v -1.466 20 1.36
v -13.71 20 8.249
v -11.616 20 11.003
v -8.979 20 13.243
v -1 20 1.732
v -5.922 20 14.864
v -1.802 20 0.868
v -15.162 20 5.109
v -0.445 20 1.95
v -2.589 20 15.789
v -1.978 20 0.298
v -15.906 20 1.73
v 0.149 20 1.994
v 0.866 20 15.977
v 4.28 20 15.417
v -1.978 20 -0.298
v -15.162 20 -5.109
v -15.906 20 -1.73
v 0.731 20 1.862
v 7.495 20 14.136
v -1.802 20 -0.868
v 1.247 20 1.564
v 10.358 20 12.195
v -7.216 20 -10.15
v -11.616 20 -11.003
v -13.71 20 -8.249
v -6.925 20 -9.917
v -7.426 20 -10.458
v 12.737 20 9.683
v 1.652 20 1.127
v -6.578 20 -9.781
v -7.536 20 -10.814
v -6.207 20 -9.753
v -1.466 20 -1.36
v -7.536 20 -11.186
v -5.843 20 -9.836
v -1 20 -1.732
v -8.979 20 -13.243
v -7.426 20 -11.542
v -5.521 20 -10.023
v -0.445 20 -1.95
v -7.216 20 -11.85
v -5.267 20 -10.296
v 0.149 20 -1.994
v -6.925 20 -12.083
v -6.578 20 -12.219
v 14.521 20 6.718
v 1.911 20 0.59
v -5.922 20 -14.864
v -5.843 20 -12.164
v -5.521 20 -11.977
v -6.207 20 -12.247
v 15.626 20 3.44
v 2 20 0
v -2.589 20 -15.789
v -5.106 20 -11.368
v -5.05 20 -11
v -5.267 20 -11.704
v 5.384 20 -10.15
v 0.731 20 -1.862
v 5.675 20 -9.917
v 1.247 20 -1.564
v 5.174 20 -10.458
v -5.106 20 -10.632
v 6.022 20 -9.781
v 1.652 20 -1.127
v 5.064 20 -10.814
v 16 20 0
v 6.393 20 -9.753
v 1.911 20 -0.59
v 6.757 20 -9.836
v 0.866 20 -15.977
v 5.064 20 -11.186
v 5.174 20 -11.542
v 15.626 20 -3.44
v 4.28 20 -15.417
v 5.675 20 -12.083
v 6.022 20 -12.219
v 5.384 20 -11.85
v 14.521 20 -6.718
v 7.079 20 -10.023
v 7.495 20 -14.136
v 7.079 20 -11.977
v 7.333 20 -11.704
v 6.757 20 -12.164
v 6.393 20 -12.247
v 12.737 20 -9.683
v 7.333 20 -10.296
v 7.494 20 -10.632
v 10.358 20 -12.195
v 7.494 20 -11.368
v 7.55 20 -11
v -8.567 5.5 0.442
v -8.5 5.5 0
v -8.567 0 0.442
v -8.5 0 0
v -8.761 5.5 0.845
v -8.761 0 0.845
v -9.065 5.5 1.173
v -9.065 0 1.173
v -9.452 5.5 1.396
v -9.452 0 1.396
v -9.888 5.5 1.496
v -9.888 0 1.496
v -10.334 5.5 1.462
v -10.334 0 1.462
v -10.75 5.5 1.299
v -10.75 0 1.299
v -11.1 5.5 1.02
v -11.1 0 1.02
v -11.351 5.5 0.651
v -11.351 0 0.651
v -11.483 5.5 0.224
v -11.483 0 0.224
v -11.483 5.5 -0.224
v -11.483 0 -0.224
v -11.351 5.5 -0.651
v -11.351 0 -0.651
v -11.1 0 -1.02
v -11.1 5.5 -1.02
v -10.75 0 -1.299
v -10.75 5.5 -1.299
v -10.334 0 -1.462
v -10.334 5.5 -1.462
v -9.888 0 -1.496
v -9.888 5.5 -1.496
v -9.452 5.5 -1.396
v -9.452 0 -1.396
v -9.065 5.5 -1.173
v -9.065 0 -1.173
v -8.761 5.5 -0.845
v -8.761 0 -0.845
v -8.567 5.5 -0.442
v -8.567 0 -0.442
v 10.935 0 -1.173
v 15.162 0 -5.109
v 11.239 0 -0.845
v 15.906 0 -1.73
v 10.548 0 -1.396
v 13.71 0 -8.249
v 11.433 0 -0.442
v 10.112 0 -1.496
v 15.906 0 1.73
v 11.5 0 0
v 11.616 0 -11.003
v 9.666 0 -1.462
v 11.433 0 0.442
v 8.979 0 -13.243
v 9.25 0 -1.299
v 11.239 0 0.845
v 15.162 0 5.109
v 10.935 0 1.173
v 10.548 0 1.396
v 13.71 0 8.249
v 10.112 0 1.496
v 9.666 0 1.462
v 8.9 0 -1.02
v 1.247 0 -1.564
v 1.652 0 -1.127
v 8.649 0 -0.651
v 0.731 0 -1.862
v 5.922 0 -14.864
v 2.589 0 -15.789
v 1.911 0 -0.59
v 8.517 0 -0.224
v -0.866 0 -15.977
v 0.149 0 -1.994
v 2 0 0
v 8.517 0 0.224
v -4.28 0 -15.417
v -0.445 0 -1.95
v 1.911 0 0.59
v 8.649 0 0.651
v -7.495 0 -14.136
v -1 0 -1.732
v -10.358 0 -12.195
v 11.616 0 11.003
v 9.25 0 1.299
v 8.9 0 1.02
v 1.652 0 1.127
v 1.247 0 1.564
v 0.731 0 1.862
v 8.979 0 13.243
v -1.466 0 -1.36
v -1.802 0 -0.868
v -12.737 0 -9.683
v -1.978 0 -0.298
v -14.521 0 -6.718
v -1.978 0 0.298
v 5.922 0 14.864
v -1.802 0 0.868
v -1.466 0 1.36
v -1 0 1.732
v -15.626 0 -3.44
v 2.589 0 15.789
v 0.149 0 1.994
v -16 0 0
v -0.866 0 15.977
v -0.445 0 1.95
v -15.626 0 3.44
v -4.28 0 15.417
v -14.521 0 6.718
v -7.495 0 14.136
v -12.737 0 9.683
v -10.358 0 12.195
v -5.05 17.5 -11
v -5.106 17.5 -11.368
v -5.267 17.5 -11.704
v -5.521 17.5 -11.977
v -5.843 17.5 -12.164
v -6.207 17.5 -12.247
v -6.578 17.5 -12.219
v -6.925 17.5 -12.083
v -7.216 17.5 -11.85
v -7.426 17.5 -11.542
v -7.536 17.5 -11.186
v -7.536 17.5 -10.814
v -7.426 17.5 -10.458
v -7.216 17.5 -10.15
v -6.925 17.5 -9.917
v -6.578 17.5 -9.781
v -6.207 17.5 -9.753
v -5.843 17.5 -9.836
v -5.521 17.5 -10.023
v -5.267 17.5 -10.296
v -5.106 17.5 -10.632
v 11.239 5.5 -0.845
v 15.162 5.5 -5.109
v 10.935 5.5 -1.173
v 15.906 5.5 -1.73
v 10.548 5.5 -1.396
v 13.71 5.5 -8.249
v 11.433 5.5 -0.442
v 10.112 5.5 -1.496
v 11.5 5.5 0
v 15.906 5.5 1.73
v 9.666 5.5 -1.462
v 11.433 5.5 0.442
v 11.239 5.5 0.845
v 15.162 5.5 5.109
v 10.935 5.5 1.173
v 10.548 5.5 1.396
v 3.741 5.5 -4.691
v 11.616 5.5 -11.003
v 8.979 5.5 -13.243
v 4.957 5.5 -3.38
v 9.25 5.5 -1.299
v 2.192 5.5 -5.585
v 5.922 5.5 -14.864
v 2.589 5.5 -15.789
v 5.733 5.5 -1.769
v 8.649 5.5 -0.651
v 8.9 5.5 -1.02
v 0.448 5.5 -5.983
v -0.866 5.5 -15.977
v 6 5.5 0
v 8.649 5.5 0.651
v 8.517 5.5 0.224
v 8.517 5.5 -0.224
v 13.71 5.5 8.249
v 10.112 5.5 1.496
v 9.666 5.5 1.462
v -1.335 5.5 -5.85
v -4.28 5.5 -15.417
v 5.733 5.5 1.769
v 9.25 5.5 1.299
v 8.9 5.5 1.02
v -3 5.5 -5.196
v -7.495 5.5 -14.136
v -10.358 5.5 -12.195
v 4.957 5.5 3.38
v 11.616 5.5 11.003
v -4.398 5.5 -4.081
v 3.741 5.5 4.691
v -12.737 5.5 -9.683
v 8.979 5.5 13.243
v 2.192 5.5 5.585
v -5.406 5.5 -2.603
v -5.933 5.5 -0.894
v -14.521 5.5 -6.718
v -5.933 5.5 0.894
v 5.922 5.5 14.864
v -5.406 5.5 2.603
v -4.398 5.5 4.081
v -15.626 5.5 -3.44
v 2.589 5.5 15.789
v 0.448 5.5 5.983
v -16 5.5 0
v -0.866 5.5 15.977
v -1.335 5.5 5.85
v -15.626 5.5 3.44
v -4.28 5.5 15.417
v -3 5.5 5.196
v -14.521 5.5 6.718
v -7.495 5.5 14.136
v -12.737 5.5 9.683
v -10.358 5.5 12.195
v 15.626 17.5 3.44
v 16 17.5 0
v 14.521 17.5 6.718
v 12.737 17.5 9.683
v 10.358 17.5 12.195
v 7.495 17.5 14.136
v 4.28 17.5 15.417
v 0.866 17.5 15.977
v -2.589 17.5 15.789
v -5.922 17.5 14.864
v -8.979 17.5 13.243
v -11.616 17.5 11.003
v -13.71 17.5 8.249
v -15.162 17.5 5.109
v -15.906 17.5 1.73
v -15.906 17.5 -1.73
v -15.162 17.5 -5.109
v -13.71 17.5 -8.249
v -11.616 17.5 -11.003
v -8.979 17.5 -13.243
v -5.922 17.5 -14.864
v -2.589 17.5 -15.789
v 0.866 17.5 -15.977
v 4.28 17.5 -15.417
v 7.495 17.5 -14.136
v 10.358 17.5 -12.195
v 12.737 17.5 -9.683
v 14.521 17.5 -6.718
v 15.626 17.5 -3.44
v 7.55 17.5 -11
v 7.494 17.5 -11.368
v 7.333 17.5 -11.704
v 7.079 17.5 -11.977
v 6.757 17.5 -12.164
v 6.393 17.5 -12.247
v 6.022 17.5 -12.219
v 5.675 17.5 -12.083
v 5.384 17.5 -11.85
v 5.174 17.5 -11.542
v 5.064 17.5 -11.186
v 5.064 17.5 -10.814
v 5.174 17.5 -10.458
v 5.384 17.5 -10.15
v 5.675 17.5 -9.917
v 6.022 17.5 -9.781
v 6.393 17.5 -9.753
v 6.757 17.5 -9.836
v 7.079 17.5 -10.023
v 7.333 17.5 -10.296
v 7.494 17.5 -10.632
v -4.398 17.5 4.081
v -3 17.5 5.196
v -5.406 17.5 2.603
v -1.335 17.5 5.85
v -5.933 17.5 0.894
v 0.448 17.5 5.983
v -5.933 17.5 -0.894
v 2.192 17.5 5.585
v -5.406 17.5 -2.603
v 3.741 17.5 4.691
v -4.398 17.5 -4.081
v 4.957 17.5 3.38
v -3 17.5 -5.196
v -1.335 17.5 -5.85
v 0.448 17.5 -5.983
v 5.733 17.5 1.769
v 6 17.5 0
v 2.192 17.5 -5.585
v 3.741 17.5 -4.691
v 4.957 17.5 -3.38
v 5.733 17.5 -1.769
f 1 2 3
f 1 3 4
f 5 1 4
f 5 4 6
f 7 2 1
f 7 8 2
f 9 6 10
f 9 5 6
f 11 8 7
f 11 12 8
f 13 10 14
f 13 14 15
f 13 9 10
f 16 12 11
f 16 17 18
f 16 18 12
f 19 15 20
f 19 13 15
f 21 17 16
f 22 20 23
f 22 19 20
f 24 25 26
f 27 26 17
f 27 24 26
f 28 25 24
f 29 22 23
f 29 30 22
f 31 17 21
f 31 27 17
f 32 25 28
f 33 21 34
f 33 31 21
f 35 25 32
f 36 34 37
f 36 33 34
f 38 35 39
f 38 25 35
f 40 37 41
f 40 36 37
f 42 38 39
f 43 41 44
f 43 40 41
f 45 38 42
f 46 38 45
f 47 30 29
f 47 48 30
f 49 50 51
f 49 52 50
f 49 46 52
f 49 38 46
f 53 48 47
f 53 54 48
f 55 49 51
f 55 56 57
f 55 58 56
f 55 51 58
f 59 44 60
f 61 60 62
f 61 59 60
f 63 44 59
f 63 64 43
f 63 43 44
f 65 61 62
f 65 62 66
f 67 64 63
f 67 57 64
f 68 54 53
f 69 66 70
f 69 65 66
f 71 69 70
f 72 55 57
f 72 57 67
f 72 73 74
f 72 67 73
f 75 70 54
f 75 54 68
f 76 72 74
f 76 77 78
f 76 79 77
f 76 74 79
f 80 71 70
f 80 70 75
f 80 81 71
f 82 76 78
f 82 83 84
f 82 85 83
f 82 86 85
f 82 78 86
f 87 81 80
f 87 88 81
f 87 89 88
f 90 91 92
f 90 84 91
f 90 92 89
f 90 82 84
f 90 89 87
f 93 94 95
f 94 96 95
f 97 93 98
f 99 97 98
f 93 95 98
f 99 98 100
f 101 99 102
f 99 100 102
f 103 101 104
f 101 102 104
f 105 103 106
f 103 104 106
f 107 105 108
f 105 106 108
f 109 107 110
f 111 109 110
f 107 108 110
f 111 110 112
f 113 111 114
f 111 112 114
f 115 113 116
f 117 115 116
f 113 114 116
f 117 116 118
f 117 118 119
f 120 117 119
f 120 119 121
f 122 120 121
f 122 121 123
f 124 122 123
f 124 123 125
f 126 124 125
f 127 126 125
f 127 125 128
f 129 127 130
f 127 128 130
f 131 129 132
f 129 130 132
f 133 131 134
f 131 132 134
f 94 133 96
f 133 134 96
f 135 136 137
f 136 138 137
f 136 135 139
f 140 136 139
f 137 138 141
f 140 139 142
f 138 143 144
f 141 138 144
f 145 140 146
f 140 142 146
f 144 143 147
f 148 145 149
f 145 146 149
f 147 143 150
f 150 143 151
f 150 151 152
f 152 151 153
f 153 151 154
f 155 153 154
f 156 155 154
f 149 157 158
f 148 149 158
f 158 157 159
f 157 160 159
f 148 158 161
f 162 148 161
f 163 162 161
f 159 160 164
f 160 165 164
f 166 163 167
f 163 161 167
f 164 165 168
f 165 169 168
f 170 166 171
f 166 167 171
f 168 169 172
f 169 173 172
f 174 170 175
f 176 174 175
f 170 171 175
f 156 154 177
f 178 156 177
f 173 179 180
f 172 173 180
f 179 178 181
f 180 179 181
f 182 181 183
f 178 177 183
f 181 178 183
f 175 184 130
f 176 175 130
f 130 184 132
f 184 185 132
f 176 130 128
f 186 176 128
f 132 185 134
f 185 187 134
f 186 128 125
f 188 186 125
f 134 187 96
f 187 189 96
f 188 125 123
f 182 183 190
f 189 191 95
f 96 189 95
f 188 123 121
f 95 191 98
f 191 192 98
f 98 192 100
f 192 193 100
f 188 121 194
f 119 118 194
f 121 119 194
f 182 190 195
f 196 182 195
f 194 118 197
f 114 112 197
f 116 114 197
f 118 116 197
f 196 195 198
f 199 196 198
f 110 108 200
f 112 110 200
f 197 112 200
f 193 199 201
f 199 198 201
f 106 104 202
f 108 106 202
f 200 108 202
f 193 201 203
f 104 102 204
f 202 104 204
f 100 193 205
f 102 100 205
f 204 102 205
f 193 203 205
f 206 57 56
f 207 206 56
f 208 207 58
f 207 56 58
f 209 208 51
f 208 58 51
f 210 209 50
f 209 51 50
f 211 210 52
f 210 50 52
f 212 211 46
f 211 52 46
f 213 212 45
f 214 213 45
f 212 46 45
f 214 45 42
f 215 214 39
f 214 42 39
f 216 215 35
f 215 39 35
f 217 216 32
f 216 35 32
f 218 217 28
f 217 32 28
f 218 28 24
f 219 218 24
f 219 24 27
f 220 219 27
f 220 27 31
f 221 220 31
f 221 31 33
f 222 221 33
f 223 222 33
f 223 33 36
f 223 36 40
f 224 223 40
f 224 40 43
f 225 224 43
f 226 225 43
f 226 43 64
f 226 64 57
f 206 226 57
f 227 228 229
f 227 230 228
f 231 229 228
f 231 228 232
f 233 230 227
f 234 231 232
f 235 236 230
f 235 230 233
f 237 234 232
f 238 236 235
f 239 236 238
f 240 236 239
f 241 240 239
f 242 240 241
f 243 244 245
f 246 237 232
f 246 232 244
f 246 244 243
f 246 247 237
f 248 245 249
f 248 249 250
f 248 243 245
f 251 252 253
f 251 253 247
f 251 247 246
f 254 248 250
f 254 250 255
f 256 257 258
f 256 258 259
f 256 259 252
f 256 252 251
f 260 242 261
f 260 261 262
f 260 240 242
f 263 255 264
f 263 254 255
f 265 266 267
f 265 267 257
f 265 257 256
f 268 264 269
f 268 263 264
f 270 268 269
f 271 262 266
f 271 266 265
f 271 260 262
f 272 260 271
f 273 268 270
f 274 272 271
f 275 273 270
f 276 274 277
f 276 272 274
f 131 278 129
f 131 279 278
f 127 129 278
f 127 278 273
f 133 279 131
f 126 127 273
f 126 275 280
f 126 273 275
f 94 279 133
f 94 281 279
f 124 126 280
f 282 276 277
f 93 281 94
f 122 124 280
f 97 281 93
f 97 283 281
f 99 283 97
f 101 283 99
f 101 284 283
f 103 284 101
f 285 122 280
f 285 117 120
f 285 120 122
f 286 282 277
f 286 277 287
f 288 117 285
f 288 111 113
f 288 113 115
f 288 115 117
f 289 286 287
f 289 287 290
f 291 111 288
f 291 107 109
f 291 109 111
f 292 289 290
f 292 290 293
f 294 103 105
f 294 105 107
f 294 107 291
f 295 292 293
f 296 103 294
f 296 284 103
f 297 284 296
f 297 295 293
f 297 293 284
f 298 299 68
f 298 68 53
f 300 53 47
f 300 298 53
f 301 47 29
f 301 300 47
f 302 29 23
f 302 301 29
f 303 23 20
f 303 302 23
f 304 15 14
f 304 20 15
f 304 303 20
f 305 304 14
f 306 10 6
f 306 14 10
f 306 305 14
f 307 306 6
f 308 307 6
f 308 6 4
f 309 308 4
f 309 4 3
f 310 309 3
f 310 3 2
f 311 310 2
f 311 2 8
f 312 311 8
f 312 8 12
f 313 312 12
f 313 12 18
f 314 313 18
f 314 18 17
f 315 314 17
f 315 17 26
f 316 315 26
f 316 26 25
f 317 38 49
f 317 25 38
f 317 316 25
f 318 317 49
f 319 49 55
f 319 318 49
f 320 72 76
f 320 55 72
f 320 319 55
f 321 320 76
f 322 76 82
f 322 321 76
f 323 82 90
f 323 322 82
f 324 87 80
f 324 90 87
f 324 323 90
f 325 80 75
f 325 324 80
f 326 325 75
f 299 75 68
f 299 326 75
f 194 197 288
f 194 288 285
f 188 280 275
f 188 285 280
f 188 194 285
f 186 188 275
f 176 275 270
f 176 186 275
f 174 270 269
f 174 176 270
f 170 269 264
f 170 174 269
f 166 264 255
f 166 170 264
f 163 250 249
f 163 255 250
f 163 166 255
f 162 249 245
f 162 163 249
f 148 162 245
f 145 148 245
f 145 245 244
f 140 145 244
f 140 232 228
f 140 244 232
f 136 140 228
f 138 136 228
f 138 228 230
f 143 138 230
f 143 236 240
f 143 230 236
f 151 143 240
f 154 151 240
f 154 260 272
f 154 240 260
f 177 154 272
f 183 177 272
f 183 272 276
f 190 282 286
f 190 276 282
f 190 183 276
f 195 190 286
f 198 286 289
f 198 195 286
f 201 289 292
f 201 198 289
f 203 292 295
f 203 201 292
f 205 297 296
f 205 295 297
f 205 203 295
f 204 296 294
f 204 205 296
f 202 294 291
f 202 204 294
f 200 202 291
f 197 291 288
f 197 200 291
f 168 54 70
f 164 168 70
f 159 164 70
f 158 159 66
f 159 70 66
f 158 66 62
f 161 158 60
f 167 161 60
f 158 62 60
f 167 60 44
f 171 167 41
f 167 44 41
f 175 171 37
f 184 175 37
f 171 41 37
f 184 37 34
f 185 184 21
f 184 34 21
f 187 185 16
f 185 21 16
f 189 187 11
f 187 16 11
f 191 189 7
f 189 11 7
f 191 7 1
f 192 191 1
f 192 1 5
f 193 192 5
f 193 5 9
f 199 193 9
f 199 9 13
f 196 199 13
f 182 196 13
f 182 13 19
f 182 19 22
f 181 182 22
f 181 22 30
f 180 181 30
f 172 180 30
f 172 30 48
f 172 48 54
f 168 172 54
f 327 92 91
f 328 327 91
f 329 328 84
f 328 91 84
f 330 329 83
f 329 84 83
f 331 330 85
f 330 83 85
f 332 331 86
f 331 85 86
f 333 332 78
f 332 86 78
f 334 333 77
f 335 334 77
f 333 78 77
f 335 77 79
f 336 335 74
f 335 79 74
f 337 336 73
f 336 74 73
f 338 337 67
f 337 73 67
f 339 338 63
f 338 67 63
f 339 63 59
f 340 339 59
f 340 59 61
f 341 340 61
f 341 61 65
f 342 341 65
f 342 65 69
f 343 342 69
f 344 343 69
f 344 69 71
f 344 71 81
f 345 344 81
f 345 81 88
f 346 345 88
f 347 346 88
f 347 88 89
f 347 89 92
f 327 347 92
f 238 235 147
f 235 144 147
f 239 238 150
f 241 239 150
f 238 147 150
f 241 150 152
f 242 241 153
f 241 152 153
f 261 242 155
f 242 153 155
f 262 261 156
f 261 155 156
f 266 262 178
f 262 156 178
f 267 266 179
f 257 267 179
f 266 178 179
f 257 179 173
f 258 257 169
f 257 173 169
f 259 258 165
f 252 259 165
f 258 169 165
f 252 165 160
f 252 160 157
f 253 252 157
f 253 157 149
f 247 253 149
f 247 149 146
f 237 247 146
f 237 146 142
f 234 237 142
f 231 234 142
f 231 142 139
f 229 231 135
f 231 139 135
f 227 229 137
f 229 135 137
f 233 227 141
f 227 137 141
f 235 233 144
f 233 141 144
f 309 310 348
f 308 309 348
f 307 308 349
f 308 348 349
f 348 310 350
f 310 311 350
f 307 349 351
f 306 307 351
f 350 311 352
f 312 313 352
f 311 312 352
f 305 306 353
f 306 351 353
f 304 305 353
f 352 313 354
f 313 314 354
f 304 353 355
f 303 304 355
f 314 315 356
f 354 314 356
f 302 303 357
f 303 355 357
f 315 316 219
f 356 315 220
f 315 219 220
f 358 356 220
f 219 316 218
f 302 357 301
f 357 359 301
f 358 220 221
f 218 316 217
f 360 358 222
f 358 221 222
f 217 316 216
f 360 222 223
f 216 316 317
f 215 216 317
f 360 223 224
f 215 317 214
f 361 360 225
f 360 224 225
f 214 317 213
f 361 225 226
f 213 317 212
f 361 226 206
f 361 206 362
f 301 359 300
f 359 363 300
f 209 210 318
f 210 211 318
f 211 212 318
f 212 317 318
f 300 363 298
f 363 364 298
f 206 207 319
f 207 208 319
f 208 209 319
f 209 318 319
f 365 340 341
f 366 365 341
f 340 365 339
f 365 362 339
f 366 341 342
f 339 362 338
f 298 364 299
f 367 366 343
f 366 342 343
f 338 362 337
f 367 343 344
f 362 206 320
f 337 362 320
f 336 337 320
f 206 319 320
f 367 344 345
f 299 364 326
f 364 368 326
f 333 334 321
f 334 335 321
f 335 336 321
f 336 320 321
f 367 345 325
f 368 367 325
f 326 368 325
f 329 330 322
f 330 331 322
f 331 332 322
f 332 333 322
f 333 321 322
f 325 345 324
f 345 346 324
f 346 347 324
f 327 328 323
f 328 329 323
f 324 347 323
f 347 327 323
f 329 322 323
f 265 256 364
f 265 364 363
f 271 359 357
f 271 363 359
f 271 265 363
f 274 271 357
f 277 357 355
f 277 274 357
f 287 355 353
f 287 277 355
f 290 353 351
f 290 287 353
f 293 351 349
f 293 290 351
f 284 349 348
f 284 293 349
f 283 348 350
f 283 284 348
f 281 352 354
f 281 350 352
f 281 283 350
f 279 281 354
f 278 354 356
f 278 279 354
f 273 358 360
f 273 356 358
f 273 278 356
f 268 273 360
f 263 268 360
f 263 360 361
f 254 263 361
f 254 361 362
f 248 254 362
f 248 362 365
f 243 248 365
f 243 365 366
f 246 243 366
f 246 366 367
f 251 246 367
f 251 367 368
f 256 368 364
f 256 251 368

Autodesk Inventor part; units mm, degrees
ref_plane "YZ Plane" through (0, 0, 0) normal (1, 0, 0) x (0, 1, 0)
ref_plane "XZ Plane" through (0, 0, 0) normal (0, 1, 0) x (-1, 0, 0)
ref_plane "XY Plane" through (0, 0, 0) normal (0, 0, 1) x (1, 0, 0)
sketch "Esquisse1" plane through (0, 0, 0) normal (0, 1, 0) x (-1, 0, 0)
  circle A0 centre (0, 0) radius 16
  dimension "D" = 32
extrude "Extrusion1" add sketch "Esquisse1" along normal blind 5.5
sketch "Esquisse2" plane through (0, 5.5, 0) normal (0, 1, 0) x (1, 0, 0)
  circle A0 centre (0, 0) radius 16 projected
  circle A1 centre (0, 0) radius 6
  dimension "d3" = 12
extrude "Extrusion2" add sketch "Esquisse2" along normal blind 12 contours A1
sketch "Esquisse4" plane through (0, 17.5, 0) normal (0, 1, 0) x (1, 0, 0)
  circle A0 centre (0, 0) radius 6 projected
  circle A1 centre (0, 0) radius 16
  dimension "d8" = 32
extrude "Extrusion4" add sketch "Esquisse4" along normal blind 2.5 contours A0 | A1
sketch "Esquisse5" plane through (0, 20, 0) normal (0, 1, 0) x (1, 0, 0)
  circle A0 centre (0, 0) radius 16 projected
  circle A1 centre (0, 0) radius 2
  dimension "P" = 4
extrude "Extrusion5" cut sketch "Esquisse5" against normal through all contours A1
sketch "Esquisse6" plane through (0, 0, 0) normal (0, -1, 0) x (1, 0, 0)
  circle A0 centre (0, 0) radius 2 projected
  circle A1 centre (-10, 0) radius 1.5
  circle A2 centre (10, 0) radius 1.5
  dimension "p2" = 3
  dimension "d15" = 3
  dimension "d16" = 20
  dimension "d17" = 10
extrude "Extrusion6" cut sketch "Esquisse6" against normal blind 5.5 contours A1 | A2
sketch "Esquisse7" plane through (0, 20, 0) normal (0, 1, 0) x (1, 0, 0)
  circle A0 centre (0, 0) radius 2 projected
  circle A1 centre (-6.3, 11) radius 1.25
  circle A2 centre (6.3, 11) radius 1.25
  dimension "e" = 2.5
  dimension "d21" = 12.6
  dimension "d22" = 6.3
  dimension "d23" = 11
  dimension "d24" = 2.5
  dimension "d25" = 11
extrude "Extrusion7" cut sketch "Esquisse7" against normal blind 2.5 contours A1 | A2
equation "\"d8\" = D"
equation "\"d15\" = p2"
equation "\"d17\" = 0.5 * d16"
equation "\"d18\" = d1"
equation "\"d22\" = 0.5 * d21"
equation "\"d24\" = e"
equation "\"d25\" = d23"
equation "\"d1\" = 5.5"
properties part number "Girouette" material "Plastique ABS"
